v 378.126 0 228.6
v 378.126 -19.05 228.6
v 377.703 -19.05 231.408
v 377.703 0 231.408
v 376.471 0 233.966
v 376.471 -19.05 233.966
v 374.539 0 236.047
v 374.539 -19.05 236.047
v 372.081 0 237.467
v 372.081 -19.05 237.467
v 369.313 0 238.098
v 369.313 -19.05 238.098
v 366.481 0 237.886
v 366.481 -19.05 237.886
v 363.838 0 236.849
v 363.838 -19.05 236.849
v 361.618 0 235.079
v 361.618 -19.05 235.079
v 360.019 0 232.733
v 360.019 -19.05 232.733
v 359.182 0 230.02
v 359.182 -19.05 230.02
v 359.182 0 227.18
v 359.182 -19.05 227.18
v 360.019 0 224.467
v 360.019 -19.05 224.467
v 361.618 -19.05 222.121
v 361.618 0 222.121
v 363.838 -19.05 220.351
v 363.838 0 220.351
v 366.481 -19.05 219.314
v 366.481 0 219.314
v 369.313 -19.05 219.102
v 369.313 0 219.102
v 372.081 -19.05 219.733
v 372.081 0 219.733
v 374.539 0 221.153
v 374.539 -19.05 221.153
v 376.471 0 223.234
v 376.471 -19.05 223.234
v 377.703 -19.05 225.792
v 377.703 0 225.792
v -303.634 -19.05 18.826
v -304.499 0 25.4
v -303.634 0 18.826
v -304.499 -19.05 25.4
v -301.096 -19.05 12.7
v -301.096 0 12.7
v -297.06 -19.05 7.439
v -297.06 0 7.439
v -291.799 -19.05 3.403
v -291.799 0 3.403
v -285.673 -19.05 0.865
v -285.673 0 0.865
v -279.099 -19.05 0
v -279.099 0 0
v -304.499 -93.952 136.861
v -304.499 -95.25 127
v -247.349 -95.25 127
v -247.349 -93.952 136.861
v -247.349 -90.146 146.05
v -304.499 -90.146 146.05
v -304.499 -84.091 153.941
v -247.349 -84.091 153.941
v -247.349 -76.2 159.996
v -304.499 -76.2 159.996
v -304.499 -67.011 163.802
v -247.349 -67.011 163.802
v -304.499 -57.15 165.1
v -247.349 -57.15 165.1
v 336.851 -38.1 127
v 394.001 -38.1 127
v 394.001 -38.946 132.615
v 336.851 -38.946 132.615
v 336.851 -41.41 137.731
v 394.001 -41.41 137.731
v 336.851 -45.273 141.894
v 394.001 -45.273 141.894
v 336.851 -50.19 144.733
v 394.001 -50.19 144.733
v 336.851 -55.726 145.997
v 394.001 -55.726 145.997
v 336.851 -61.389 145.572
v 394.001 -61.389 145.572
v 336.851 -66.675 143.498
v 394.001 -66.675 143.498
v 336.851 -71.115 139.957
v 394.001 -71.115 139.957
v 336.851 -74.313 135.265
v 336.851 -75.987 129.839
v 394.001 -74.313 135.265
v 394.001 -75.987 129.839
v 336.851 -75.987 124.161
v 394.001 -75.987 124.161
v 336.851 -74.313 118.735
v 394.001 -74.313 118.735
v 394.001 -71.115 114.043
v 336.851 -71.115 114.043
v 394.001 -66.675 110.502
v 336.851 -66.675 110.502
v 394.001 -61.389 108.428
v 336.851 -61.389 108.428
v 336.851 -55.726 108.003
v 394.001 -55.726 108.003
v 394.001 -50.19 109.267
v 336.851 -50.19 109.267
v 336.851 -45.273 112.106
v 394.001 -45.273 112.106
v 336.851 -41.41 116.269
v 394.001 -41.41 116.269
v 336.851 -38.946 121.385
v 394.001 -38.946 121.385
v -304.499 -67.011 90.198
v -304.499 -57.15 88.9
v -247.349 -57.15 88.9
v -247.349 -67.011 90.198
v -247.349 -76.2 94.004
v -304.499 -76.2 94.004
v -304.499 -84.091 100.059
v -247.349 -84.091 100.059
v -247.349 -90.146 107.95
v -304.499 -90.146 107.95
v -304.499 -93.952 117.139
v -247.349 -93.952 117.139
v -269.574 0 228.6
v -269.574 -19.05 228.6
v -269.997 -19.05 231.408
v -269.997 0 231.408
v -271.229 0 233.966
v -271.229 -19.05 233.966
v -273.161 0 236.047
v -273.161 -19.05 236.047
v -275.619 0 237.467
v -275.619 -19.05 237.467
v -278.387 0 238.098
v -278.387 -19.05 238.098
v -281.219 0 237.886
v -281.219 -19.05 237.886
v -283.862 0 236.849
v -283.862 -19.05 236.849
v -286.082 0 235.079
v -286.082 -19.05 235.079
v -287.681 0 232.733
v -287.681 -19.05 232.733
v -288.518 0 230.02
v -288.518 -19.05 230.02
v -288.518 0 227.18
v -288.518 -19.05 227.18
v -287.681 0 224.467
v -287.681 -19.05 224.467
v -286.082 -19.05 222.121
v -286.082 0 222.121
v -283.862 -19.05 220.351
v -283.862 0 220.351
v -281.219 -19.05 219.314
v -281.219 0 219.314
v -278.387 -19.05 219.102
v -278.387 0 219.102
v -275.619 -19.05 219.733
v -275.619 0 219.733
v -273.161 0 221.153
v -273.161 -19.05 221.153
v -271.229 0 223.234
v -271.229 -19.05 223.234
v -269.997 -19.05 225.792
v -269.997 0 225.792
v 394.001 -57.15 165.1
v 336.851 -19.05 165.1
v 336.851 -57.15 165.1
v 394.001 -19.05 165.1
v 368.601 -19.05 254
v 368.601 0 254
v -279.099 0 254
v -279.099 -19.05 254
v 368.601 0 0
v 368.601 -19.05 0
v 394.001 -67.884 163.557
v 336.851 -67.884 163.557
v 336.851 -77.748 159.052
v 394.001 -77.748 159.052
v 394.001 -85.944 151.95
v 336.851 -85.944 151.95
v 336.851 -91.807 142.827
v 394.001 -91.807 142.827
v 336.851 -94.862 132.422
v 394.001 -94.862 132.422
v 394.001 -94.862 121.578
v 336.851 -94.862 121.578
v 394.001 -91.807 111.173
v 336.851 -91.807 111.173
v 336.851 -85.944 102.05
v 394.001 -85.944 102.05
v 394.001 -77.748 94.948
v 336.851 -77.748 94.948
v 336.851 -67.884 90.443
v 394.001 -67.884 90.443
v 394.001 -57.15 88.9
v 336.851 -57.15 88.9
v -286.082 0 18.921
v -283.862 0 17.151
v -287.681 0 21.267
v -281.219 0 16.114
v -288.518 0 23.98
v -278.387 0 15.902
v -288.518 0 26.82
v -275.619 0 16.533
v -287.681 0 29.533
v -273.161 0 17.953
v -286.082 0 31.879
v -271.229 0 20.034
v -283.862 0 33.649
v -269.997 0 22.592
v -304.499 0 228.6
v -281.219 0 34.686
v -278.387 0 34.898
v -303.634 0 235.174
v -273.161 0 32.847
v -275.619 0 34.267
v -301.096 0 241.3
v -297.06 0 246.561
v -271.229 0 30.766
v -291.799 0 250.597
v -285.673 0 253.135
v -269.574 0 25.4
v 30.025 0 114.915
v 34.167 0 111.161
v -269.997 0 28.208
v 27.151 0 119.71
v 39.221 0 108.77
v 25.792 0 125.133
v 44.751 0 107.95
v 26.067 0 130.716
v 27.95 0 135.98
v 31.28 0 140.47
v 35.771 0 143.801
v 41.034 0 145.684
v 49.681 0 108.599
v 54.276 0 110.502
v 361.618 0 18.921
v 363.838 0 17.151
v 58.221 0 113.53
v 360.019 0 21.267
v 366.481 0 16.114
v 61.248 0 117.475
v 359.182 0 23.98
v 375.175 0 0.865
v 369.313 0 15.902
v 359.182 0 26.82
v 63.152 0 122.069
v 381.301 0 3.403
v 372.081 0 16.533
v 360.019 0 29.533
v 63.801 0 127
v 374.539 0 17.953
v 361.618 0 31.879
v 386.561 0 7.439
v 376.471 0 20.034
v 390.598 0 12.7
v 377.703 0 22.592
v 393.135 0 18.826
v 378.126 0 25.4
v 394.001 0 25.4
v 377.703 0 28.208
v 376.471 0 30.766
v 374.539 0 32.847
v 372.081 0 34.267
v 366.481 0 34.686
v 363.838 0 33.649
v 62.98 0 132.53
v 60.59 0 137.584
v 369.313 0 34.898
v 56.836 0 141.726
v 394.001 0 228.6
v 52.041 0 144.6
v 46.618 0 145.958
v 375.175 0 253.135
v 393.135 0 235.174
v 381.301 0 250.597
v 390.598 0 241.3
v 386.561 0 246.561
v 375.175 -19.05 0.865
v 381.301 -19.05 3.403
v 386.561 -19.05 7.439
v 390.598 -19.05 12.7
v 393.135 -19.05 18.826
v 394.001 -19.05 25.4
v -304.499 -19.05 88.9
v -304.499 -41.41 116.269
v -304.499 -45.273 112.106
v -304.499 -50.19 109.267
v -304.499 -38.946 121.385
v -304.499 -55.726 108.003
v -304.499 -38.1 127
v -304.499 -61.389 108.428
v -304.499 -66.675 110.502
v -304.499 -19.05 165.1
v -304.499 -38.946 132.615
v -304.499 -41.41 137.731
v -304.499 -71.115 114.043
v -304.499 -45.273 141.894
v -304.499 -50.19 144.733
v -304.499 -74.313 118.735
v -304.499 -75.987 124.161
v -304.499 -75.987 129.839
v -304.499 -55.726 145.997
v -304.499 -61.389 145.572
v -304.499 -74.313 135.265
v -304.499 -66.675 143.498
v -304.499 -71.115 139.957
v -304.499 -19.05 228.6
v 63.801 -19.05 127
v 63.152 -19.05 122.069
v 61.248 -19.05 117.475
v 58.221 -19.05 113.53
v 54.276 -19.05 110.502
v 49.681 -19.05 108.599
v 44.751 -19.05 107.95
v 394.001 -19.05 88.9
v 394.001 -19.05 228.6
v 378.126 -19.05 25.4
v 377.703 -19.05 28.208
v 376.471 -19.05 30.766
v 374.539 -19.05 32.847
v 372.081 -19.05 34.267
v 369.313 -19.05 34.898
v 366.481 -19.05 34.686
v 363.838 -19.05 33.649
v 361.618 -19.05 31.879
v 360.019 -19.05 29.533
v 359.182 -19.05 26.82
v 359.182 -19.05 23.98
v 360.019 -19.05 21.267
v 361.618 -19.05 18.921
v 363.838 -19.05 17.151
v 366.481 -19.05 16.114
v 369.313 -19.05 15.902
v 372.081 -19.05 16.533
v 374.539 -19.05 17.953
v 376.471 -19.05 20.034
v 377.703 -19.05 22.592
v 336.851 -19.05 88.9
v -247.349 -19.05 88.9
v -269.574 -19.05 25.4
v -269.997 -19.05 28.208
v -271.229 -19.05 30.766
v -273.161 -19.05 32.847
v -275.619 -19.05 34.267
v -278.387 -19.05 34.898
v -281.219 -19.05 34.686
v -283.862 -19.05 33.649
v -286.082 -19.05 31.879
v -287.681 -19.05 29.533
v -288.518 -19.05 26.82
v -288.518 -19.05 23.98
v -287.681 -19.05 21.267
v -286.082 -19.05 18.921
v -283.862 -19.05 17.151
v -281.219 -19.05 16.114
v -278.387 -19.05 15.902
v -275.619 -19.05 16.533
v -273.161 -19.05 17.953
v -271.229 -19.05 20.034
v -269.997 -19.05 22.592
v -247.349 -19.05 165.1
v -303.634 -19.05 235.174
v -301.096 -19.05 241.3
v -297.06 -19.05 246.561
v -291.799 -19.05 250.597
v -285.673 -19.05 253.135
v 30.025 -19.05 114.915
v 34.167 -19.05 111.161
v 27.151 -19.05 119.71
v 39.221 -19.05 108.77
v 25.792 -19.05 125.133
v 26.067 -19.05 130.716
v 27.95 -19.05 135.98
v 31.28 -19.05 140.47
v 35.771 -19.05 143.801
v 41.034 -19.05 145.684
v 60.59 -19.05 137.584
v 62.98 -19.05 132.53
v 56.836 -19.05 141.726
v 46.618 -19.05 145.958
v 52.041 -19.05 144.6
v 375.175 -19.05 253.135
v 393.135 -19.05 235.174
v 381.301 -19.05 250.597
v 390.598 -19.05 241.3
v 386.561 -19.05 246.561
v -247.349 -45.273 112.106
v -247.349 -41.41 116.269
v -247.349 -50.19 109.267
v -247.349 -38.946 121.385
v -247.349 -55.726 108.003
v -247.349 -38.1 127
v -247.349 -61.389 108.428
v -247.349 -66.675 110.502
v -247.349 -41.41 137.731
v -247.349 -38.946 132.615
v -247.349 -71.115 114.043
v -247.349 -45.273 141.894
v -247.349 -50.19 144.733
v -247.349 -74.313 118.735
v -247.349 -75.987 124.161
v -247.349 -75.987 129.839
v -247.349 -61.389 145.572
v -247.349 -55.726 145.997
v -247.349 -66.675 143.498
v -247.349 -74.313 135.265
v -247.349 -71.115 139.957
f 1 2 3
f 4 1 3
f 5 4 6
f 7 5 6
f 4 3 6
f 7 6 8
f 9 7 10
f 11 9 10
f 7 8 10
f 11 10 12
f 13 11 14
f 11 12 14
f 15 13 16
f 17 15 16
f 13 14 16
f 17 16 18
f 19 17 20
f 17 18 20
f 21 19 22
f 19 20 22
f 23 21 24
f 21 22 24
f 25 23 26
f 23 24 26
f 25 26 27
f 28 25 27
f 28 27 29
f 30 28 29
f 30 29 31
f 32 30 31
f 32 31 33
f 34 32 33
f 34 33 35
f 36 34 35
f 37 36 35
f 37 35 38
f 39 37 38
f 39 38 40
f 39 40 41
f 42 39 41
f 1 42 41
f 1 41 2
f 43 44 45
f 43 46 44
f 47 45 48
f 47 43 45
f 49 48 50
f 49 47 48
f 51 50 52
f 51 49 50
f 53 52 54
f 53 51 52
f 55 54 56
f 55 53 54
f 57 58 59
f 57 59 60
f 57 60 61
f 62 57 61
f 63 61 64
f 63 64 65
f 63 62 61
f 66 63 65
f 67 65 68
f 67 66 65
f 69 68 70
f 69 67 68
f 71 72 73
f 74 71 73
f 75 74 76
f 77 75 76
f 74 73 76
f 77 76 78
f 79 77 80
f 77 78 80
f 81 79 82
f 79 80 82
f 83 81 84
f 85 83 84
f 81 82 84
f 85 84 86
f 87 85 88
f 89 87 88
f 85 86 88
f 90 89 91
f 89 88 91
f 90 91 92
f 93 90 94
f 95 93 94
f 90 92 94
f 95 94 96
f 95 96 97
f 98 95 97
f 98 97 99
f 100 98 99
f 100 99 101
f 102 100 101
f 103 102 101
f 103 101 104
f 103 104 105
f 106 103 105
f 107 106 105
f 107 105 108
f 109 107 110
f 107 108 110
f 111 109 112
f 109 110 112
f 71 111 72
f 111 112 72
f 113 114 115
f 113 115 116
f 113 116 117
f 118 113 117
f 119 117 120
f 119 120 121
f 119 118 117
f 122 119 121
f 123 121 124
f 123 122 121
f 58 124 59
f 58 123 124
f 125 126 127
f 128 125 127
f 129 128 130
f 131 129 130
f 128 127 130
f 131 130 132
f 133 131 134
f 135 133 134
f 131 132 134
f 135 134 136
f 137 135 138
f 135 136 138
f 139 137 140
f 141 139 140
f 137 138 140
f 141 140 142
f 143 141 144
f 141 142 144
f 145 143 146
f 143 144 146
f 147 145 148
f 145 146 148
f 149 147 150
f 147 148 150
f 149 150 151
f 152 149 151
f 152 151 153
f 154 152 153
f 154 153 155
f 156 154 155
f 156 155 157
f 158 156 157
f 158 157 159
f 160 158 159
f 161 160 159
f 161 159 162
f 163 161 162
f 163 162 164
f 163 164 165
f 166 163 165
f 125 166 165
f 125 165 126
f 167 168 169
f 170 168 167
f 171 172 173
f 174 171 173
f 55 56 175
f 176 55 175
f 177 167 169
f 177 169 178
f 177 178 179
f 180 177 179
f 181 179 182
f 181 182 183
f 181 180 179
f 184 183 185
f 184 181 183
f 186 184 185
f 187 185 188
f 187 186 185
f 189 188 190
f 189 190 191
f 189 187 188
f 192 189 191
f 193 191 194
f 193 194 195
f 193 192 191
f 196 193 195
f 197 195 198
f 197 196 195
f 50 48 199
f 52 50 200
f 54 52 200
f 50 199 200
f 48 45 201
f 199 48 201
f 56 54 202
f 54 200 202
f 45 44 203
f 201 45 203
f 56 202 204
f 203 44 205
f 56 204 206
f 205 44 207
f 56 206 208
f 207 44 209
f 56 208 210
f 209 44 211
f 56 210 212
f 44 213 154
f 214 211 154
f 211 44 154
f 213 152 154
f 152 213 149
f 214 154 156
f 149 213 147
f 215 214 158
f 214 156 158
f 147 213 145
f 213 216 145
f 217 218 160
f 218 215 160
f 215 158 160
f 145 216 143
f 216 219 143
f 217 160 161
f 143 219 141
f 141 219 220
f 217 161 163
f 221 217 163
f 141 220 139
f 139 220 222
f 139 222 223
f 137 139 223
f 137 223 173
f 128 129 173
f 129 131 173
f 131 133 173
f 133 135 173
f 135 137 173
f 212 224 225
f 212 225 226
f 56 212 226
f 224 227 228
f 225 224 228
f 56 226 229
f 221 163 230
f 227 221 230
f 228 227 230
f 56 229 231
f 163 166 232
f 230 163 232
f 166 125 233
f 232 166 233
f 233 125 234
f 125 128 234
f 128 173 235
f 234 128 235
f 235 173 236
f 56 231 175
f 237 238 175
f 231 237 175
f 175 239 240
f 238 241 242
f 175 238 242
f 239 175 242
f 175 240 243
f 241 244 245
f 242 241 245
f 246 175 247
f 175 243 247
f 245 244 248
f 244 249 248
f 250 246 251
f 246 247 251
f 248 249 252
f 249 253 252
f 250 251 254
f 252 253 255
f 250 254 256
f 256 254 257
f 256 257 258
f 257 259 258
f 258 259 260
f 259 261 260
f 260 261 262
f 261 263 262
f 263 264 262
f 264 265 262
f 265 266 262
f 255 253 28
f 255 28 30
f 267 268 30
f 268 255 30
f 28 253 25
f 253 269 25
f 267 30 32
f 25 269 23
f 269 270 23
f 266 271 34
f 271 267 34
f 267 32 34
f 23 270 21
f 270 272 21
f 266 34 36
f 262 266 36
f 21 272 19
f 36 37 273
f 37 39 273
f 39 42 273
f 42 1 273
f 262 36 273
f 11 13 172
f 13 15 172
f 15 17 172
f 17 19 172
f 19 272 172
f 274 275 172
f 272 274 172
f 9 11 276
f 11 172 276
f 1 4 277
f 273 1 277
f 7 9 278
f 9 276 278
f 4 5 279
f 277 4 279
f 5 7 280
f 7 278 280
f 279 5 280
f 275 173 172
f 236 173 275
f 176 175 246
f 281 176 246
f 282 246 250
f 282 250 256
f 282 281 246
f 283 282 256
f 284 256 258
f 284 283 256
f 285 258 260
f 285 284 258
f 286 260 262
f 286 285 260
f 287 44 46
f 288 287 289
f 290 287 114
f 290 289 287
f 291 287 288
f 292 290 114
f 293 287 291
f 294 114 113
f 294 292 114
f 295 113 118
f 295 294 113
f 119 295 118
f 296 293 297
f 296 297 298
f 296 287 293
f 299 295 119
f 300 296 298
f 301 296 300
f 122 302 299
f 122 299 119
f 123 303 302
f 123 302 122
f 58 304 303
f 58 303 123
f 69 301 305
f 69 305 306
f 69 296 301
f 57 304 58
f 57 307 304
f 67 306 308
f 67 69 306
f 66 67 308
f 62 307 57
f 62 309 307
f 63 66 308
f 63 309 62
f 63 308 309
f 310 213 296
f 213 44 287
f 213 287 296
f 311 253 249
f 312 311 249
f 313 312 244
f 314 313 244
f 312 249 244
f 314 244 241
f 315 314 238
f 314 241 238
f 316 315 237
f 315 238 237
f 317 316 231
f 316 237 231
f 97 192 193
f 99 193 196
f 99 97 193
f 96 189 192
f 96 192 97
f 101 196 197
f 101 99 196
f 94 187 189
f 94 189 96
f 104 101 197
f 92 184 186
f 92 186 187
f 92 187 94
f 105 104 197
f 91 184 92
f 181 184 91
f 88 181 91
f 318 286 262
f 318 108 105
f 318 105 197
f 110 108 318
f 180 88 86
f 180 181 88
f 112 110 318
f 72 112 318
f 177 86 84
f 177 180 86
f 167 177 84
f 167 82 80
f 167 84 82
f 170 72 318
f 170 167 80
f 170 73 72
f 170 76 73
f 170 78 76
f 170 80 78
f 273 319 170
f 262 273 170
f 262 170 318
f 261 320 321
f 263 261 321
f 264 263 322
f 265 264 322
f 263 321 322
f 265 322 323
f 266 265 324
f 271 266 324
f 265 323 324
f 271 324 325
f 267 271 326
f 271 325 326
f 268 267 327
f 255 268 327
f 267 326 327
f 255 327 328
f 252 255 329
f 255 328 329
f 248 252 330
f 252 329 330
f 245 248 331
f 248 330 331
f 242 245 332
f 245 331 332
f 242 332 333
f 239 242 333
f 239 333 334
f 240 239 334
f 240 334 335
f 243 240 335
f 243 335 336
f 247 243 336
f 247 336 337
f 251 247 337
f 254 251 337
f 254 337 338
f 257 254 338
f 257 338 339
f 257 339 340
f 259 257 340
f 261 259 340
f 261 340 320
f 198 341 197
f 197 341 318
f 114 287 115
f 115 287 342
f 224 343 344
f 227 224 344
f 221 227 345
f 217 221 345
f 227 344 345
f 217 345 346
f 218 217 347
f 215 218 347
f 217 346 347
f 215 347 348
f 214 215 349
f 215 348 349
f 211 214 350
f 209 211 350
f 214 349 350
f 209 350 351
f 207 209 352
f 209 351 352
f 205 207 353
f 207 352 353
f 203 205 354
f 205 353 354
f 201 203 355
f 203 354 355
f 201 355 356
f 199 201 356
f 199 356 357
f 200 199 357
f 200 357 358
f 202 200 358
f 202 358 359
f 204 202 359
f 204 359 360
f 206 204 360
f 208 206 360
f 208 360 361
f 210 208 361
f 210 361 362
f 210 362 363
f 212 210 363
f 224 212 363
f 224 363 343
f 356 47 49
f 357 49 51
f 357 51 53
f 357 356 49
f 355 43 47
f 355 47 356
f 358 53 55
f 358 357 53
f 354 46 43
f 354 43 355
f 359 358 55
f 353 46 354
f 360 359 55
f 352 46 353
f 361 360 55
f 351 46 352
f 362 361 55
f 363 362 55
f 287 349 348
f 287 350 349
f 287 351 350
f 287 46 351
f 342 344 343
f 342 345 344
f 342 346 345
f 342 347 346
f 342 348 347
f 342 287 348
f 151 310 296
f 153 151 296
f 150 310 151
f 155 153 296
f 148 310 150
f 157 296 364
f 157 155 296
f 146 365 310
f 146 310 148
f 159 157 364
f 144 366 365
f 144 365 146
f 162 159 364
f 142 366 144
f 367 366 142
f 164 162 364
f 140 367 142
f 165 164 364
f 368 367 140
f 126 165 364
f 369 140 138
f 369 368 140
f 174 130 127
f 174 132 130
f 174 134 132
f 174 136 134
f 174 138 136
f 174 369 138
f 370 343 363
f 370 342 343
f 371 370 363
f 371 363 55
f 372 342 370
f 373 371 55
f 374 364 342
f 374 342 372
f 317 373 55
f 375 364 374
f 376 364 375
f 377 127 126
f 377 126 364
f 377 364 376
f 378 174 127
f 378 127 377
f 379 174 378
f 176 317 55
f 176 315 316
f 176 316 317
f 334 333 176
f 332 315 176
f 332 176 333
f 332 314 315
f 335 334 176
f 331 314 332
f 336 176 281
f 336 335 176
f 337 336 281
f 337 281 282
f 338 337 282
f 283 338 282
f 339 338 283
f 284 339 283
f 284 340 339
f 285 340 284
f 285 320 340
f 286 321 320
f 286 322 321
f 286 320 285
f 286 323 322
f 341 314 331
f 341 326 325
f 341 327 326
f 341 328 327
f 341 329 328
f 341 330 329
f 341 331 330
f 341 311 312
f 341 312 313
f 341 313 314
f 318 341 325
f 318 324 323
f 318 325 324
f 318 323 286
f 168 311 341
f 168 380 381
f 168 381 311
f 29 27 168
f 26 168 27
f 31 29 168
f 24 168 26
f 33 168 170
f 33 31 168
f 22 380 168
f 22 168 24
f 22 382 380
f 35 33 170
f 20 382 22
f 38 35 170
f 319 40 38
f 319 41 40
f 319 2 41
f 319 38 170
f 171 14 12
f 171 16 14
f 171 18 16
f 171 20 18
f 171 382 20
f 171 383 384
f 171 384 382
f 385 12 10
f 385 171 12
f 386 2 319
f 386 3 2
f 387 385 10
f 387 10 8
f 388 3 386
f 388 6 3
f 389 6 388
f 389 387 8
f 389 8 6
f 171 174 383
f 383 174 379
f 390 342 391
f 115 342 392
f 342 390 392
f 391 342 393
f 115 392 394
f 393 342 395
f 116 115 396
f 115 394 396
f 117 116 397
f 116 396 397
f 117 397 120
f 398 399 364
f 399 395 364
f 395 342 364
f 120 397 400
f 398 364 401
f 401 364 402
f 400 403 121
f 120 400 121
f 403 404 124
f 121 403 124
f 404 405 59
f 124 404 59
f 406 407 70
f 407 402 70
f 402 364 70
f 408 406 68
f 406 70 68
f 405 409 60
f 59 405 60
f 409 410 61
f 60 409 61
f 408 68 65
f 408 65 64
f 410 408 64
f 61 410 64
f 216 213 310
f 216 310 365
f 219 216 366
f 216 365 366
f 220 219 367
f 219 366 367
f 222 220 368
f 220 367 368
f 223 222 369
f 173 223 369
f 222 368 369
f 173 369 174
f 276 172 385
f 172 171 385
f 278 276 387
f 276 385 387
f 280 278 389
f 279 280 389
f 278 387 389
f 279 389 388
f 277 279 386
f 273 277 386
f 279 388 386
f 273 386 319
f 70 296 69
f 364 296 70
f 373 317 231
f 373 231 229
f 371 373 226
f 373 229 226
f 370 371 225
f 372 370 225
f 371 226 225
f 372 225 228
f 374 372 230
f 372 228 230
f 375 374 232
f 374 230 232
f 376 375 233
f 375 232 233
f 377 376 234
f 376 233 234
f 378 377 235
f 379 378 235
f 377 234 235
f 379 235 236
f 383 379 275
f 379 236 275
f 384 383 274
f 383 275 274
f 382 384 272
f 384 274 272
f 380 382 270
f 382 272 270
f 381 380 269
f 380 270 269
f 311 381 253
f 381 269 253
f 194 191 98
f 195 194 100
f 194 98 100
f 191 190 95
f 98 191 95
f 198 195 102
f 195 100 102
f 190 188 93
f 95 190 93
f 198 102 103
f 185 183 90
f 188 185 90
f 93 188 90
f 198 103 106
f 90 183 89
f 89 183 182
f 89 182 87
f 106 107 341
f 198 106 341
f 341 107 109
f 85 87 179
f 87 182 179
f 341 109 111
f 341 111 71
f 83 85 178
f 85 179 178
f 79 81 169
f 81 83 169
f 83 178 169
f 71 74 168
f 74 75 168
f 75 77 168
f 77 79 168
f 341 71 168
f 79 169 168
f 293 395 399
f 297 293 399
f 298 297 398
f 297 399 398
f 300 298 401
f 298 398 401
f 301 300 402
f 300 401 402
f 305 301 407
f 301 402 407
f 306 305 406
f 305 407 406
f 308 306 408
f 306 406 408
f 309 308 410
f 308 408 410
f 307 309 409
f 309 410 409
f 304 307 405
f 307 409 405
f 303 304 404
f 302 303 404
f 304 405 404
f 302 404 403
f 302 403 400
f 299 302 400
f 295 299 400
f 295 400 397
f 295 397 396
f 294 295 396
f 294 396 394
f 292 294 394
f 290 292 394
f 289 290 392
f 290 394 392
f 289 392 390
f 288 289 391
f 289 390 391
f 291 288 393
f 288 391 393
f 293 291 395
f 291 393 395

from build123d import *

# Parameters (mm, degrees)
F1_DEPTH  = 19.05
F2_R      = 25.4
F4_W      = 57.15
F4_H      = 38.1
F5_DEPTH  = 38.1
F7_DEPTH  = 57.15
F8_R      = 19.05
F10_DEPTH = 76.2
F12_DEPTH = 38.1
F14_DEPTH = 57.15
F16_DEPTH = 76.2
F15_R     = 19.05
F17_DEPTH = 57.15
F11_R     = 9.525
F18_DEPTH = 25.4


with BuildPart() as f1:
    # F0 (on Front) → F1 (new body)
    with BuildSketch(Plane.XZ):
        Polygon((-304.499298, 254), (-304.499298, 0), (44.750702, 0), (394.000702, 0), (394.000702, 254), align=None)
        with BuildLine():
            ThreePointArc((63.800702, 127), (58.221086, 113.529616), (44.750702, 107.95))
            ThreePointArc((44.750702, 107.95), (31.280317, 140.470384), (63.800702, 127))
        make_face(mode=Mode.SUBTRACT)
    extrude(amount=F1_DEPTH)

    # F2
    f2_edges = [f1.edges().sort_by_distance(p)[0] for p in [
        (-304.499298, -9.525, 254),
        (394.000702, -9.525, 254),
        (394.000702, -9.525, 0),
        (-304.499298, -9.525, 0),
    ]]
    fillet(f2_edges, radius=F2_R)

    # F4 (on face) → F5 (join)
    with BuildSketch(Plane.XZ.offset(19.05)):
        with Locations((-275.924298, 146.05)):
            Rectangle(F4_W, F4_H)
        with Locations((-275.924298, 107.95)):
            Rectangle(F4_W, F4_H)
    extrude(amount=F5_DEPTH)

    # F6 (on face) → F7 (join)
    with BuildSketch(Plane(origin=(-304.499298, 0, 0), x_dir=(0, -1, 0), z_dir=(-1, 0, 0))):
        with BuildLine():
            ThreePointArc((57.15, 88.9), (84.090768, 100.059232), (95.25, 127))
            ThreePointArc((95.25, 127), (84.090768, 153.940768), (57.15, 165.1))
            Line((57.15, 165.1), (57.15, 88.9))
        make_face()
    extrude(amount=-F7_DEPTH)

    # F8 (on face) → F10 (cut)
    with BuildSketch(Plane.YZ.offset(-247.349298)):
        with Locations((-57.15, 127)):
            Circle(F8_R)
    extrude(amount=-F10_DEPTH, mode=Mode.SUBTRACT)

    # F4 (on face) → F12 (join)
    with BuildSketch(Plane.XZ.offset(19.05)):
        with Locations((-275.924298, 146.05)):
            Rectangle(F4_W, F4_H)
        with Locations((-275.924298, 107.95)):
            Rectangle(F4_W, F4_H)
        with Locations((365.425702, 107.95)):
            Rectangle(F4_W, F4_H)
        with Locations((365.425702, 146.05)):
            Rectangle(F4_W, F4_H)
    extrude(amount=F12_DEPTH)

    # F13 (on face) → F14 (join)
    with BuildSketch(Plane.YZ.offset(394.000702)):
        with BuildLine():
            Line((-57.15, 88.9), (-57.15, 165.1))
            ThreePointArc((-57.15, 165.1), (-95.25, 127), (-57.15, 88.9))
        make_face()
    extrude(amount=-F14_DEPTH)

    # F8 (on face) → F16 (cut)
    with BuildSketch(Plane.YZ.offset(-247.349298)):
        with Locations((-57.15, 127)):
            Circle(F8_R)
    extrude(amount=-F16_DEPTH, mode=Mode.SUBTRACT)

    # F15 (on face) → F17 (cut)
    with BuildSketch(Plane.YZ.offset(394.000702)):
        with Locations((-57.15, 127)):
            Circle(F15_R)
    extrude(amount=-F17_DEPTH, mode=Mode.SUBTRACT)

    # F11 (on face) → F18 (cut)
    with BuildSketch(Plane.XZ.offset(19.05)):
        with Locations((-279.099298, 228.6)):
            Circle(F11_R)
        with Locations((-279.099298, 25.4)):
            Circle(F11_R)
        with Locations((368.600702, 228.6)):
            Circle(F11_R)
        with Locations((368.600702, 25.4)):
            Circle(F11_R)
    extrude(amount=-F18_DEPTH, mode=Mode.SUBTRACT)


solid = f1.part
